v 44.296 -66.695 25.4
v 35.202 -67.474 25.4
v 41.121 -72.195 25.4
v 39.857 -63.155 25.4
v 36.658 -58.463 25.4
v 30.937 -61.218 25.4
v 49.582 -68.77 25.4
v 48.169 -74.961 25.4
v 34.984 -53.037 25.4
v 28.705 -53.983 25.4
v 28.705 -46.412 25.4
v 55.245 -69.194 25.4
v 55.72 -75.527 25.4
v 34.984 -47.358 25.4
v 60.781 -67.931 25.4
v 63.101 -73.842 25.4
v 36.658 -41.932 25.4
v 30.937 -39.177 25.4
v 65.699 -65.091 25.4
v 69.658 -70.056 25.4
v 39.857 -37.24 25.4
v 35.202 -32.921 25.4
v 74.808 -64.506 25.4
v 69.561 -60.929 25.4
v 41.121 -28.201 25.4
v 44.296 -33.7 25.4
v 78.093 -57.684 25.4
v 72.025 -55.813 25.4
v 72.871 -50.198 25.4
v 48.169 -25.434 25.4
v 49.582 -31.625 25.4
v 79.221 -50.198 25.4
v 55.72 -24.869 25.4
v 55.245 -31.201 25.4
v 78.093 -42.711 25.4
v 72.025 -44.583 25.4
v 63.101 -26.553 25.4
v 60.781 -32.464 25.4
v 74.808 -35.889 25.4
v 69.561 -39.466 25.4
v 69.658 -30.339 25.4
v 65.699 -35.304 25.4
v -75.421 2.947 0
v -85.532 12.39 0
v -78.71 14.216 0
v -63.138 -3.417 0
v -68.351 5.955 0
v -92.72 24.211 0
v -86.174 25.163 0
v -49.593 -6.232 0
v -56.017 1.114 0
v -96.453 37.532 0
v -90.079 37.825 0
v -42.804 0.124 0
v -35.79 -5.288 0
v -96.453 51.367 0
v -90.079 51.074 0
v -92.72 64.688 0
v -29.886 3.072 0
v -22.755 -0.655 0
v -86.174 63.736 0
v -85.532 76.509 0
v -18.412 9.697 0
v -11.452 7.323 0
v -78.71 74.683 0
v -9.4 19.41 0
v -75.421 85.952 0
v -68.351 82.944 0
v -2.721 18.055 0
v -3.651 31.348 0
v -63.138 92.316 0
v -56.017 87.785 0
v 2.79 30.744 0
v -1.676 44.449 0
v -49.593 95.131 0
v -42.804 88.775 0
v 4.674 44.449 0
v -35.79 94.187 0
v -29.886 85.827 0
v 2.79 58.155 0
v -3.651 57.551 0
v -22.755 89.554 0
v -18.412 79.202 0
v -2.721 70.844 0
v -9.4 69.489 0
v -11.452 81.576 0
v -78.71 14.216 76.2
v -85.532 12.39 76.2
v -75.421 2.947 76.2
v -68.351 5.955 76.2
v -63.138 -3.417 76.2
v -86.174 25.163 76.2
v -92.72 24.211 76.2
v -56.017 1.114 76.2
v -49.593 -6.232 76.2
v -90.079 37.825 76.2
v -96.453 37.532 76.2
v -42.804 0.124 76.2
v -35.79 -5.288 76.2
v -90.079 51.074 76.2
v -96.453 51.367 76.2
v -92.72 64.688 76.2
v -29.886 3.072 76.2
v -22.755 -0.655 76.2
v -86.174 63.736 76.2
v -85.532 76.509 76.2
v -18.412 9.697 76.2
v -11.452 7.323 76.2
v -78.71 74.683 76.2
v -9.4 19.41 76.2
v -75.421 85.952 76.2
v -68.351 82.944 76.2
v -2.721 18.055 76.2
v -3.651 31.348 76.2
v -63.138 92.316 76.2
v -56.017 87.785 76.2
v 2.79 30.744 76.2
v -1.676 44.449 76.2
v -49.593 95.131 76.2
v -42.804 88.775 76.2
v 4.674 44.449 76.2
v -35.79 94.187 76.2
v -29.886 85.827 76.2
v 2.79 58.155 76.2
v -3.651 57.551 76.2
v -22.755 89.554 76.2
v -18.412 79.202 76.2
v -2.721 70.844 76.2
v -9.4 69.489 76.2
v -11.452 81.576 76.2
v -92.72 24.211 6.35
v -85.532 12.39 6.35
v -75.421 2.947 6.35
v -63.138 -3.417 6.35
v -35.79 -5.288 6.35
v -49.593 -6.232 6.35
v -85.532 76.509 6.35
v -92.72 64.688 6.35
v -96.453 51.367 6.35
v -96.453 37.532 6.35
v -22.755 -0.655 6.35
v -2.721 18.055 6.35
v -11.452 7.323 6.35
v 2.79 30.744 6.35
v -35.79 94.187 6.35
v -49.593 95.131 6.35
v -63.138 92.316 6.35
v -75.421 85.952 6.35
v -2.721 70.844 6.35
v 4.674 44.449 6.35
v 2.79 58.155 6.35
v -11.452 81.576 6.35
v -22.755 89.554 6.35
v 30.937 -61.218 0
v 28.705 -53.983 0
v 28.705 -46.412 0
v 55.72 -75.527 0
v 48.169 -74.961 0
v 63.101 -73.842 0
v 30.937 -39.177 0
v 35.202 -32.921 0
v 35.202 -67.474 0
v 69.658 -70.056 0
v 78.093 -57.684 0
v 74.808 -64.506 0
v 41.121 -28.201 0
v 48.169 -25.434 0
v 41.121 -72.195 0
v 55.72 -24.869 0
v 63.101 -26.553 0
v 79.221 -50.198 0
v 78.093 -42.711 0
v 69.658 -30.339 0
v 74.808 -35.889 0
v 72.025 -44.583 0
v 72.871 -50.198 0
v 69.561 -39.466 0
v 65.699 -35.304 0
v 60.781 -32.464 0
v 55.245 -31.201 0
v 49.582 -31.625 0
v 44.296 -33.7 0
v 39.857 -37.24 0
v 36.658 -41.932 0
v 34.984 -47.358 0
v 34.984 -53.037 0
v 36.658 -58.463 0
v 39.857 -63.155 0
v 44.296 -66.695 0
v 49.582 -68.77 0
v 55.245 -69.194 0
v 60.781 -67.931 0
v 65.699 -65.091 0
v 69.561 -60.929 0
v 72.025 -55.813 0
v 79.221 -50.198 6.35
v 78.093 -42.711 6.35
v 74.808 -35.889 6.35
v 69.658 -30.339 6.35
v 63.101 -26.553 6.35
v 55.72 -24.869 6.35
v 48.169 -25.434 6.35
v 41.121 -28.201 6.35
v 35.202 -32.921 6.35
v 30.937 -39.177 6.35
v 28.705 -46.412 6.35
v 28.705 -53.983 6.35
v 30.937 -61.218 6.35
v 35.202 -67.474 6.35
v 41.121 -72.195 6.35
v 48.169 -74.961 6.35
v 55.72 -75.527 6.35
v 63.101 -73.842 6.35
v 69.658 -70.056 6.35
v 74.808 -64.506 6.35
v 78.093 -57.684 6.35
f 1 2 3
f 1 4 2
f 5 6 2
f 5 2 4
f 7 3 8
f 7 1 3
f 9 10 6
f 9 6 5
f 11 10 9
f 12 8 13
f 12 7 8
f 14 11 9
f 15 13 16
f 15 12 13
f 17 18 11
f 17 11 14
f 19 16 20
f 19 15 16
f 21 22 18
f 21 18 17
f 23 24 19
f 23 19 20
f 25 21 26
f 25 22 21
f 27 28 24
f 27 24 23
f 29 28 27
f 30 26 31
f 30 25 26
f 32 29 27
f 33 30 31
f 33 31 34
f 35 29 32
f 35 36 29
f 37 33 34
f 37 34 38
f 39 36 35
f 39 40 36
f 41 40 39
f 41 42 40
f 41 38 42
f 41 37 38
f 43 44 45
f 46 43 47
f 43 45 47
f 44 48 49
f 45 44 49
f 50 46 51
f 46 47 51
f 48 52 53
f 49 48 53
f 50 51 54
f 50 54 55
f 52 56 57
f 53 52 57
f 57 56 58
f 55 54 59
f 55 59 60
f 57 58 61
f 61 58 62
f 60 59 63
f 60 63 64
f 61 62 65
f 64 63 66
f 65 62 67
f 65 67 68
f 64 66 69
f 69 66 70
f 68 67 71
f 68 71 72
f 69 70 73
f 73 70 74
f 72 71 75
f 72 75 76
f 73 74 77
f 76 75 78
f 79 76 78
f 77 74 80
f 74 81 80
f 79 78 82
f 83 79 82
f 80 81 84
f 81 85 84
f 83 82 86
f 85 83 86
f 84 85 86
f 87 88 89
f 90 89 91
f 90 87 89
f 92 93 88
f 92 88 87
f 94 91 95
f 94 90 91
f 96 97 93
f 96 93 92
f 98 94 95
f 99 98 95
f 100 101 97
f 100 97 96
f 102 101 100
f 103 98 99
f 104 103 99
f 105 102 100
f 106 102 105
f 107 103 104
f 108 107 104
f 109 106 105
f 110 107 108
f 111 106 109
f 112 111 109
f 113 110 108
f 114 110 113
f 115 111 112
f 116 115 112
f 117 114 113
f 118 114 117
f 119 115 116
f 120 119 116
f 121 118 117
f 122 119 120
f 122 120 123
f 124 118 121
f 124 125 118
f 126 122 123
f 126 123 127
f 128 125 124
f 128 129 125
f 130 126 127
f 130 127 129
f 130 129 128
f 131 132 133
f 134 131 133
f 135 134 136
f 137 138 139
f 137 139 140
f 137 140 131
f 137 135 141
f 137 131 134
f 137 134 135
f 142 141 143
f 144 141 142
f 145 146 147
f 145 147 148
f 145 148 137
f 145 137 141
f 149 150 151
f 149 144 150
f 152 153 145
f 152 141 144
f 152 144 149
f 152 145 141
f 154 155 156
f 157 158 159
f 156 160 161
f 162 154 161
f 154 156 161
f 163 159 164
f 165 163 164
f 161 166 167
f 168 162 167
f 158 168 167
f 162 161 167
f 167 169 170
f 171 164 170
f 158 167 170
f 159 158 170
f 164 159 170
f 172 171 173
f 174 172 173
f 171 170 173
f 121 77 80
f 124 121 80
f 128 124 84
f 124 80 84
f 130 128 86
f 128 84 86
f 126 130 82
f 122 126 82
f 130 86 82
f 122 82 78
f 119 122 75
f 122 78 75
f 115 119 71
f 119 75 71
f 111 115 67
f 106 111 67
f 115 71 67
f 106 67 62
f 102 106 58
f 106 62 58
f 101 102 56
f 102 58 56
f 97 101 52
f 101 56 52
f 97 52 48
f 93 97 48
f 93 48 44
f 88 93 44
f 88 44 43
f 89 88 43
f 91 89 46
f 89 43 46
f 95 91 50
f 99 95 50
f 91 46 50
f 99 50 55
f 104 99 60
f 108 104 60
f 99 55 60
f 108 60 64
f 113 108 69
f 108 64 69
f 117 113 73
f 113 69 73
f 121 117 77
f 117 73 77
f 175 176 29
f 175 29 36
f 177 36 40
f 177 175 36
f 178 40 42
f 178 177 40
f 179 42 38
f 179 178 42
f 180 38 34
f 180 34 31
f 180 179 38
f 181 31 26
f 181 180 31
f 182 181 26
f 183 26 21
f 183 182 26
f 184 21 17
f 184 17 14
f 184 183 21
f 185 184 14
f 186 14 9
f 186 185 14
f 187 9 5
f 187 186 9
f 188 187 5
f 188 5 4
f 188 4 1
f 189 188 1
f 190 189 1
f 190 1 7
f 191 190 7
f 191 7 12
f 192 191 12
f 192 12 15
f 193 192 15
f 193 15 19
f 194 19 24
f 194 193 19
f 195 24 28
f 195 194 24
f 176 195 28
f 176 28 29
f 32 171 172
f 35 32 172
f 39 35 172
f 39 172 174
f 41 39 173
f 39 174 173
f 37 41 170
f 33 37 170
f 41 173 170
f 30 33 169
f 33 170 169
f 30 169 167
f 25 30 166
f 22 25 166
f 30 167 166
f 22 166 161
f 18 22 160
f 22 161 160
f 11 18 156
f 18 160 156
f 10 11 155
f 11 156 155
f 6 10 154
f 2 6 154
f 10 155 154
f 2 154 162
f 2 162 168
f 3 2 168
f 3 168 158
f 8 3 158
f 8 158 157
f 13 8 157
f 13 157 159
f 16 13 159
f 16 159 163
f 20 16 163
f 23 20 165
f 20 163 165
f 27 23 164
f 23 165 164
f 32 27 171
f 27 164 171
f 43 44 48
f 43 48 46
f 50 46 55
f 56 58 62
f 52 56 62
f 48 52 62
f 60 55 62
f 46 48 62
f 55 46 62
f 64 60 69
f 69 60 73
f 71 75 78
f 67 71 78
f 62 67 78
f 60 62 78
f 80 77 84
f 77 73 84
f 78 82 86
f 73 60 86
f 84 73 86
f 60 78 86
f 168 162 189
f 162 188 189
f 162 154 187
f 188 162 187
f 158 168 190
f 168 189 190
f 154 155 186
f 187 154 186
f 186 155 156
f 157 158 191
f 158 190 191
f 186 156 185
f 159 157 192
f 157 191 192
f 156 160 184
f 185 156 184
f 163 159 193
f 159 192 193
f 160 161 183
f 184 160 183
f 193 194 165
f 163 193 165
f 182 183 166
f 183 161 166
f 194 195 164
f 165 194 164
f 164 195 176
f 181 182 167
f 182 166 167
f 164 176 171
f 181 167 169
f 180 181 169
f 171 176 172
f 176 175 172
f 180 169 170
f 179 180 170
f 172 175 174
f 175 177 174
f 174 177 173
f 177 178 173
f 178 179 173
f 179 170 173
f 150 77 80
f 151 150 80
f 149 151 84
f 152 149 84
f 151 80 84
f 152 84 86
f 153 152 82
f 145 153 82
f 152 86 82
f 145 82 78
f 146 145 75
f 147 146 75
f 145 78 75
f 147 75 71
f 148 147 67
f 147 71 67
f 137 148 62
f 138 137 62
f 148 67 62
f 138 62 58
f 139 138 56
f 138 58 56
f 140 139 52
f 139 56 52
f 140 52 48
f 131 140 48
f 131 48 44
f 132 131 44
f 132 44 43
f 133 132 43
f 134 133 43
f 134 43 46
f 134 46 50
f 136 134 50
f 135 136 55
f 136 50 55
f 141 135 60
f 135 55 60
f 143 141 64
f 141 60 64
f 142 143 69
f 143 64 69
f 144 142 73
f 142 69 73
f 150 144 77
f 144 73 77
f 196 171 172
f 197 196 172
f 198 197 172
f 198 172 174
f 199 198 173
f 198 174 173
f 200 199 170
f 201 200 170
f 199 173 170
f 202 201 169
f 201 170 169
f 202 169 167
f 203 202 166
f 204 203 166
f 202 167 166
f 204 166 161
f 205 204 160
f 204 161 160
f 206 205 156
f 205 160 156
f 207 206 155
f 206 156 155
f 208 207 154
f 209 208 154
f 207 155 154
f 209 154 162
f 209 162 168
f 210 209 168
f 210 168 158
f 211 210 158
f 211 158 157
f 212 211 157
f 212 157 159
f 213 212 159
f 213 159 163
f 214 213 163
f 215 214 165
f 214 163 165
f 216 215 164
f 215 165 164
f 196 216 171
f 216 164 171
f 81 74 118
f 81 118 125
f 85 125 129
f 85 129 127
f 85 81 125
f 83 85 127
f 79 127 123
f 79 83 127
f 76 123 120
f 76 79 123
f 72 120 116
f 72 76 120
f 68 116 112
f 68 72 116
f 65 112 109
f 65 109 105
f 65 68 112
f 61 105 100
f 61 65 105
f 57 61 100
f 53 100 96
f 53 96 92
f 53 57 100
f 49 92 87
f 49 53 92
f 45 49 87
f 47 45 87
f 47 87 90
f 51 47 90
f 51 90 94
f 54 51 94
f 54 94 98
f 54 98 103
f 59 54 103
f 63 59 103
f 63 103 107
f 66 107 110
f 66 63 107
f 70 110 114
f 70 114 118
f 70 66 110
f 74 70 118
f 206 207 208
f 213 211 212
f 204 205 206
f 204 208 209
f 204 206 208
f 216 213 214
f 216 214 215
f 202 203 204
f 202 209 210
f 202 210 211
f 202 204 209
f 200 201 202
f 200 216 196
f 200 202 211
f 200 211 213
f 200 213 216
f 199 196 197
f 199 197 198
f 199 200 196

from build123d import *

# Parameters (mm, degrees)
F0_R     = 50.8
F0_R_2   = 44.45
F0_R_3   = 25.4
F0_R_4   = 19.05
F1_DEPTH = 6.35
F2_DEPTH = 76.2
F3_DEPTH = 25.4


with BuildPart() as f1:
    # F0 (on Top) → F1 (new body)
    with BuildSketch(Plane.XY):
        with Locations((-46.125822, 44.449462)):
            Circle(F0_R)
        with Locations((-46.125822, 44.449462)):
            Circle(F0_R_2, mode=Mode.SUBTRACT)
        with Locations((53.821475, -50.197604)):
            Circle(F0_R_3)
        with Locations((53.821475, -50.197604)):
            Circle(F0_R_4, mode=Mode.SUBTRACT)
        with Locations((-46.125822, 44.449462)):
            Circle(F0_R_2)
        with Locations((53.821475, -50.197604)):
            Circle(F0_R_4)
    extrude(amount=F1_DEPTH)


with BuildPart() as f2:
    # F0 (on Top) → F2 (new body)
    with BuildSketch(Plane.XY):
        with Locations((-46.125822, 44.449462)):
            Circle(F0_R)
        with Locations((-46.125822, 44.449462)):
            Circle(F0_R_2, mode=Mode.SUBTRACT)
    extrude(amount=F2_DEPTH)


with BuildPart() as f3:
    # F0 (on Top) → F3 (new body)
    with BuildSketch(Plane.XY):
        with Locations((53.821475, -50.197604)):
            Circle(F0_R_3)
        with Locations((53.821475, -50.197604)):
            Circle(F0_R_4, mode=Mode.SUBTRACT)
    extrude(amount=F3_DEPTH)


solid = Compound([f1.part, f2.part, f3.part])
